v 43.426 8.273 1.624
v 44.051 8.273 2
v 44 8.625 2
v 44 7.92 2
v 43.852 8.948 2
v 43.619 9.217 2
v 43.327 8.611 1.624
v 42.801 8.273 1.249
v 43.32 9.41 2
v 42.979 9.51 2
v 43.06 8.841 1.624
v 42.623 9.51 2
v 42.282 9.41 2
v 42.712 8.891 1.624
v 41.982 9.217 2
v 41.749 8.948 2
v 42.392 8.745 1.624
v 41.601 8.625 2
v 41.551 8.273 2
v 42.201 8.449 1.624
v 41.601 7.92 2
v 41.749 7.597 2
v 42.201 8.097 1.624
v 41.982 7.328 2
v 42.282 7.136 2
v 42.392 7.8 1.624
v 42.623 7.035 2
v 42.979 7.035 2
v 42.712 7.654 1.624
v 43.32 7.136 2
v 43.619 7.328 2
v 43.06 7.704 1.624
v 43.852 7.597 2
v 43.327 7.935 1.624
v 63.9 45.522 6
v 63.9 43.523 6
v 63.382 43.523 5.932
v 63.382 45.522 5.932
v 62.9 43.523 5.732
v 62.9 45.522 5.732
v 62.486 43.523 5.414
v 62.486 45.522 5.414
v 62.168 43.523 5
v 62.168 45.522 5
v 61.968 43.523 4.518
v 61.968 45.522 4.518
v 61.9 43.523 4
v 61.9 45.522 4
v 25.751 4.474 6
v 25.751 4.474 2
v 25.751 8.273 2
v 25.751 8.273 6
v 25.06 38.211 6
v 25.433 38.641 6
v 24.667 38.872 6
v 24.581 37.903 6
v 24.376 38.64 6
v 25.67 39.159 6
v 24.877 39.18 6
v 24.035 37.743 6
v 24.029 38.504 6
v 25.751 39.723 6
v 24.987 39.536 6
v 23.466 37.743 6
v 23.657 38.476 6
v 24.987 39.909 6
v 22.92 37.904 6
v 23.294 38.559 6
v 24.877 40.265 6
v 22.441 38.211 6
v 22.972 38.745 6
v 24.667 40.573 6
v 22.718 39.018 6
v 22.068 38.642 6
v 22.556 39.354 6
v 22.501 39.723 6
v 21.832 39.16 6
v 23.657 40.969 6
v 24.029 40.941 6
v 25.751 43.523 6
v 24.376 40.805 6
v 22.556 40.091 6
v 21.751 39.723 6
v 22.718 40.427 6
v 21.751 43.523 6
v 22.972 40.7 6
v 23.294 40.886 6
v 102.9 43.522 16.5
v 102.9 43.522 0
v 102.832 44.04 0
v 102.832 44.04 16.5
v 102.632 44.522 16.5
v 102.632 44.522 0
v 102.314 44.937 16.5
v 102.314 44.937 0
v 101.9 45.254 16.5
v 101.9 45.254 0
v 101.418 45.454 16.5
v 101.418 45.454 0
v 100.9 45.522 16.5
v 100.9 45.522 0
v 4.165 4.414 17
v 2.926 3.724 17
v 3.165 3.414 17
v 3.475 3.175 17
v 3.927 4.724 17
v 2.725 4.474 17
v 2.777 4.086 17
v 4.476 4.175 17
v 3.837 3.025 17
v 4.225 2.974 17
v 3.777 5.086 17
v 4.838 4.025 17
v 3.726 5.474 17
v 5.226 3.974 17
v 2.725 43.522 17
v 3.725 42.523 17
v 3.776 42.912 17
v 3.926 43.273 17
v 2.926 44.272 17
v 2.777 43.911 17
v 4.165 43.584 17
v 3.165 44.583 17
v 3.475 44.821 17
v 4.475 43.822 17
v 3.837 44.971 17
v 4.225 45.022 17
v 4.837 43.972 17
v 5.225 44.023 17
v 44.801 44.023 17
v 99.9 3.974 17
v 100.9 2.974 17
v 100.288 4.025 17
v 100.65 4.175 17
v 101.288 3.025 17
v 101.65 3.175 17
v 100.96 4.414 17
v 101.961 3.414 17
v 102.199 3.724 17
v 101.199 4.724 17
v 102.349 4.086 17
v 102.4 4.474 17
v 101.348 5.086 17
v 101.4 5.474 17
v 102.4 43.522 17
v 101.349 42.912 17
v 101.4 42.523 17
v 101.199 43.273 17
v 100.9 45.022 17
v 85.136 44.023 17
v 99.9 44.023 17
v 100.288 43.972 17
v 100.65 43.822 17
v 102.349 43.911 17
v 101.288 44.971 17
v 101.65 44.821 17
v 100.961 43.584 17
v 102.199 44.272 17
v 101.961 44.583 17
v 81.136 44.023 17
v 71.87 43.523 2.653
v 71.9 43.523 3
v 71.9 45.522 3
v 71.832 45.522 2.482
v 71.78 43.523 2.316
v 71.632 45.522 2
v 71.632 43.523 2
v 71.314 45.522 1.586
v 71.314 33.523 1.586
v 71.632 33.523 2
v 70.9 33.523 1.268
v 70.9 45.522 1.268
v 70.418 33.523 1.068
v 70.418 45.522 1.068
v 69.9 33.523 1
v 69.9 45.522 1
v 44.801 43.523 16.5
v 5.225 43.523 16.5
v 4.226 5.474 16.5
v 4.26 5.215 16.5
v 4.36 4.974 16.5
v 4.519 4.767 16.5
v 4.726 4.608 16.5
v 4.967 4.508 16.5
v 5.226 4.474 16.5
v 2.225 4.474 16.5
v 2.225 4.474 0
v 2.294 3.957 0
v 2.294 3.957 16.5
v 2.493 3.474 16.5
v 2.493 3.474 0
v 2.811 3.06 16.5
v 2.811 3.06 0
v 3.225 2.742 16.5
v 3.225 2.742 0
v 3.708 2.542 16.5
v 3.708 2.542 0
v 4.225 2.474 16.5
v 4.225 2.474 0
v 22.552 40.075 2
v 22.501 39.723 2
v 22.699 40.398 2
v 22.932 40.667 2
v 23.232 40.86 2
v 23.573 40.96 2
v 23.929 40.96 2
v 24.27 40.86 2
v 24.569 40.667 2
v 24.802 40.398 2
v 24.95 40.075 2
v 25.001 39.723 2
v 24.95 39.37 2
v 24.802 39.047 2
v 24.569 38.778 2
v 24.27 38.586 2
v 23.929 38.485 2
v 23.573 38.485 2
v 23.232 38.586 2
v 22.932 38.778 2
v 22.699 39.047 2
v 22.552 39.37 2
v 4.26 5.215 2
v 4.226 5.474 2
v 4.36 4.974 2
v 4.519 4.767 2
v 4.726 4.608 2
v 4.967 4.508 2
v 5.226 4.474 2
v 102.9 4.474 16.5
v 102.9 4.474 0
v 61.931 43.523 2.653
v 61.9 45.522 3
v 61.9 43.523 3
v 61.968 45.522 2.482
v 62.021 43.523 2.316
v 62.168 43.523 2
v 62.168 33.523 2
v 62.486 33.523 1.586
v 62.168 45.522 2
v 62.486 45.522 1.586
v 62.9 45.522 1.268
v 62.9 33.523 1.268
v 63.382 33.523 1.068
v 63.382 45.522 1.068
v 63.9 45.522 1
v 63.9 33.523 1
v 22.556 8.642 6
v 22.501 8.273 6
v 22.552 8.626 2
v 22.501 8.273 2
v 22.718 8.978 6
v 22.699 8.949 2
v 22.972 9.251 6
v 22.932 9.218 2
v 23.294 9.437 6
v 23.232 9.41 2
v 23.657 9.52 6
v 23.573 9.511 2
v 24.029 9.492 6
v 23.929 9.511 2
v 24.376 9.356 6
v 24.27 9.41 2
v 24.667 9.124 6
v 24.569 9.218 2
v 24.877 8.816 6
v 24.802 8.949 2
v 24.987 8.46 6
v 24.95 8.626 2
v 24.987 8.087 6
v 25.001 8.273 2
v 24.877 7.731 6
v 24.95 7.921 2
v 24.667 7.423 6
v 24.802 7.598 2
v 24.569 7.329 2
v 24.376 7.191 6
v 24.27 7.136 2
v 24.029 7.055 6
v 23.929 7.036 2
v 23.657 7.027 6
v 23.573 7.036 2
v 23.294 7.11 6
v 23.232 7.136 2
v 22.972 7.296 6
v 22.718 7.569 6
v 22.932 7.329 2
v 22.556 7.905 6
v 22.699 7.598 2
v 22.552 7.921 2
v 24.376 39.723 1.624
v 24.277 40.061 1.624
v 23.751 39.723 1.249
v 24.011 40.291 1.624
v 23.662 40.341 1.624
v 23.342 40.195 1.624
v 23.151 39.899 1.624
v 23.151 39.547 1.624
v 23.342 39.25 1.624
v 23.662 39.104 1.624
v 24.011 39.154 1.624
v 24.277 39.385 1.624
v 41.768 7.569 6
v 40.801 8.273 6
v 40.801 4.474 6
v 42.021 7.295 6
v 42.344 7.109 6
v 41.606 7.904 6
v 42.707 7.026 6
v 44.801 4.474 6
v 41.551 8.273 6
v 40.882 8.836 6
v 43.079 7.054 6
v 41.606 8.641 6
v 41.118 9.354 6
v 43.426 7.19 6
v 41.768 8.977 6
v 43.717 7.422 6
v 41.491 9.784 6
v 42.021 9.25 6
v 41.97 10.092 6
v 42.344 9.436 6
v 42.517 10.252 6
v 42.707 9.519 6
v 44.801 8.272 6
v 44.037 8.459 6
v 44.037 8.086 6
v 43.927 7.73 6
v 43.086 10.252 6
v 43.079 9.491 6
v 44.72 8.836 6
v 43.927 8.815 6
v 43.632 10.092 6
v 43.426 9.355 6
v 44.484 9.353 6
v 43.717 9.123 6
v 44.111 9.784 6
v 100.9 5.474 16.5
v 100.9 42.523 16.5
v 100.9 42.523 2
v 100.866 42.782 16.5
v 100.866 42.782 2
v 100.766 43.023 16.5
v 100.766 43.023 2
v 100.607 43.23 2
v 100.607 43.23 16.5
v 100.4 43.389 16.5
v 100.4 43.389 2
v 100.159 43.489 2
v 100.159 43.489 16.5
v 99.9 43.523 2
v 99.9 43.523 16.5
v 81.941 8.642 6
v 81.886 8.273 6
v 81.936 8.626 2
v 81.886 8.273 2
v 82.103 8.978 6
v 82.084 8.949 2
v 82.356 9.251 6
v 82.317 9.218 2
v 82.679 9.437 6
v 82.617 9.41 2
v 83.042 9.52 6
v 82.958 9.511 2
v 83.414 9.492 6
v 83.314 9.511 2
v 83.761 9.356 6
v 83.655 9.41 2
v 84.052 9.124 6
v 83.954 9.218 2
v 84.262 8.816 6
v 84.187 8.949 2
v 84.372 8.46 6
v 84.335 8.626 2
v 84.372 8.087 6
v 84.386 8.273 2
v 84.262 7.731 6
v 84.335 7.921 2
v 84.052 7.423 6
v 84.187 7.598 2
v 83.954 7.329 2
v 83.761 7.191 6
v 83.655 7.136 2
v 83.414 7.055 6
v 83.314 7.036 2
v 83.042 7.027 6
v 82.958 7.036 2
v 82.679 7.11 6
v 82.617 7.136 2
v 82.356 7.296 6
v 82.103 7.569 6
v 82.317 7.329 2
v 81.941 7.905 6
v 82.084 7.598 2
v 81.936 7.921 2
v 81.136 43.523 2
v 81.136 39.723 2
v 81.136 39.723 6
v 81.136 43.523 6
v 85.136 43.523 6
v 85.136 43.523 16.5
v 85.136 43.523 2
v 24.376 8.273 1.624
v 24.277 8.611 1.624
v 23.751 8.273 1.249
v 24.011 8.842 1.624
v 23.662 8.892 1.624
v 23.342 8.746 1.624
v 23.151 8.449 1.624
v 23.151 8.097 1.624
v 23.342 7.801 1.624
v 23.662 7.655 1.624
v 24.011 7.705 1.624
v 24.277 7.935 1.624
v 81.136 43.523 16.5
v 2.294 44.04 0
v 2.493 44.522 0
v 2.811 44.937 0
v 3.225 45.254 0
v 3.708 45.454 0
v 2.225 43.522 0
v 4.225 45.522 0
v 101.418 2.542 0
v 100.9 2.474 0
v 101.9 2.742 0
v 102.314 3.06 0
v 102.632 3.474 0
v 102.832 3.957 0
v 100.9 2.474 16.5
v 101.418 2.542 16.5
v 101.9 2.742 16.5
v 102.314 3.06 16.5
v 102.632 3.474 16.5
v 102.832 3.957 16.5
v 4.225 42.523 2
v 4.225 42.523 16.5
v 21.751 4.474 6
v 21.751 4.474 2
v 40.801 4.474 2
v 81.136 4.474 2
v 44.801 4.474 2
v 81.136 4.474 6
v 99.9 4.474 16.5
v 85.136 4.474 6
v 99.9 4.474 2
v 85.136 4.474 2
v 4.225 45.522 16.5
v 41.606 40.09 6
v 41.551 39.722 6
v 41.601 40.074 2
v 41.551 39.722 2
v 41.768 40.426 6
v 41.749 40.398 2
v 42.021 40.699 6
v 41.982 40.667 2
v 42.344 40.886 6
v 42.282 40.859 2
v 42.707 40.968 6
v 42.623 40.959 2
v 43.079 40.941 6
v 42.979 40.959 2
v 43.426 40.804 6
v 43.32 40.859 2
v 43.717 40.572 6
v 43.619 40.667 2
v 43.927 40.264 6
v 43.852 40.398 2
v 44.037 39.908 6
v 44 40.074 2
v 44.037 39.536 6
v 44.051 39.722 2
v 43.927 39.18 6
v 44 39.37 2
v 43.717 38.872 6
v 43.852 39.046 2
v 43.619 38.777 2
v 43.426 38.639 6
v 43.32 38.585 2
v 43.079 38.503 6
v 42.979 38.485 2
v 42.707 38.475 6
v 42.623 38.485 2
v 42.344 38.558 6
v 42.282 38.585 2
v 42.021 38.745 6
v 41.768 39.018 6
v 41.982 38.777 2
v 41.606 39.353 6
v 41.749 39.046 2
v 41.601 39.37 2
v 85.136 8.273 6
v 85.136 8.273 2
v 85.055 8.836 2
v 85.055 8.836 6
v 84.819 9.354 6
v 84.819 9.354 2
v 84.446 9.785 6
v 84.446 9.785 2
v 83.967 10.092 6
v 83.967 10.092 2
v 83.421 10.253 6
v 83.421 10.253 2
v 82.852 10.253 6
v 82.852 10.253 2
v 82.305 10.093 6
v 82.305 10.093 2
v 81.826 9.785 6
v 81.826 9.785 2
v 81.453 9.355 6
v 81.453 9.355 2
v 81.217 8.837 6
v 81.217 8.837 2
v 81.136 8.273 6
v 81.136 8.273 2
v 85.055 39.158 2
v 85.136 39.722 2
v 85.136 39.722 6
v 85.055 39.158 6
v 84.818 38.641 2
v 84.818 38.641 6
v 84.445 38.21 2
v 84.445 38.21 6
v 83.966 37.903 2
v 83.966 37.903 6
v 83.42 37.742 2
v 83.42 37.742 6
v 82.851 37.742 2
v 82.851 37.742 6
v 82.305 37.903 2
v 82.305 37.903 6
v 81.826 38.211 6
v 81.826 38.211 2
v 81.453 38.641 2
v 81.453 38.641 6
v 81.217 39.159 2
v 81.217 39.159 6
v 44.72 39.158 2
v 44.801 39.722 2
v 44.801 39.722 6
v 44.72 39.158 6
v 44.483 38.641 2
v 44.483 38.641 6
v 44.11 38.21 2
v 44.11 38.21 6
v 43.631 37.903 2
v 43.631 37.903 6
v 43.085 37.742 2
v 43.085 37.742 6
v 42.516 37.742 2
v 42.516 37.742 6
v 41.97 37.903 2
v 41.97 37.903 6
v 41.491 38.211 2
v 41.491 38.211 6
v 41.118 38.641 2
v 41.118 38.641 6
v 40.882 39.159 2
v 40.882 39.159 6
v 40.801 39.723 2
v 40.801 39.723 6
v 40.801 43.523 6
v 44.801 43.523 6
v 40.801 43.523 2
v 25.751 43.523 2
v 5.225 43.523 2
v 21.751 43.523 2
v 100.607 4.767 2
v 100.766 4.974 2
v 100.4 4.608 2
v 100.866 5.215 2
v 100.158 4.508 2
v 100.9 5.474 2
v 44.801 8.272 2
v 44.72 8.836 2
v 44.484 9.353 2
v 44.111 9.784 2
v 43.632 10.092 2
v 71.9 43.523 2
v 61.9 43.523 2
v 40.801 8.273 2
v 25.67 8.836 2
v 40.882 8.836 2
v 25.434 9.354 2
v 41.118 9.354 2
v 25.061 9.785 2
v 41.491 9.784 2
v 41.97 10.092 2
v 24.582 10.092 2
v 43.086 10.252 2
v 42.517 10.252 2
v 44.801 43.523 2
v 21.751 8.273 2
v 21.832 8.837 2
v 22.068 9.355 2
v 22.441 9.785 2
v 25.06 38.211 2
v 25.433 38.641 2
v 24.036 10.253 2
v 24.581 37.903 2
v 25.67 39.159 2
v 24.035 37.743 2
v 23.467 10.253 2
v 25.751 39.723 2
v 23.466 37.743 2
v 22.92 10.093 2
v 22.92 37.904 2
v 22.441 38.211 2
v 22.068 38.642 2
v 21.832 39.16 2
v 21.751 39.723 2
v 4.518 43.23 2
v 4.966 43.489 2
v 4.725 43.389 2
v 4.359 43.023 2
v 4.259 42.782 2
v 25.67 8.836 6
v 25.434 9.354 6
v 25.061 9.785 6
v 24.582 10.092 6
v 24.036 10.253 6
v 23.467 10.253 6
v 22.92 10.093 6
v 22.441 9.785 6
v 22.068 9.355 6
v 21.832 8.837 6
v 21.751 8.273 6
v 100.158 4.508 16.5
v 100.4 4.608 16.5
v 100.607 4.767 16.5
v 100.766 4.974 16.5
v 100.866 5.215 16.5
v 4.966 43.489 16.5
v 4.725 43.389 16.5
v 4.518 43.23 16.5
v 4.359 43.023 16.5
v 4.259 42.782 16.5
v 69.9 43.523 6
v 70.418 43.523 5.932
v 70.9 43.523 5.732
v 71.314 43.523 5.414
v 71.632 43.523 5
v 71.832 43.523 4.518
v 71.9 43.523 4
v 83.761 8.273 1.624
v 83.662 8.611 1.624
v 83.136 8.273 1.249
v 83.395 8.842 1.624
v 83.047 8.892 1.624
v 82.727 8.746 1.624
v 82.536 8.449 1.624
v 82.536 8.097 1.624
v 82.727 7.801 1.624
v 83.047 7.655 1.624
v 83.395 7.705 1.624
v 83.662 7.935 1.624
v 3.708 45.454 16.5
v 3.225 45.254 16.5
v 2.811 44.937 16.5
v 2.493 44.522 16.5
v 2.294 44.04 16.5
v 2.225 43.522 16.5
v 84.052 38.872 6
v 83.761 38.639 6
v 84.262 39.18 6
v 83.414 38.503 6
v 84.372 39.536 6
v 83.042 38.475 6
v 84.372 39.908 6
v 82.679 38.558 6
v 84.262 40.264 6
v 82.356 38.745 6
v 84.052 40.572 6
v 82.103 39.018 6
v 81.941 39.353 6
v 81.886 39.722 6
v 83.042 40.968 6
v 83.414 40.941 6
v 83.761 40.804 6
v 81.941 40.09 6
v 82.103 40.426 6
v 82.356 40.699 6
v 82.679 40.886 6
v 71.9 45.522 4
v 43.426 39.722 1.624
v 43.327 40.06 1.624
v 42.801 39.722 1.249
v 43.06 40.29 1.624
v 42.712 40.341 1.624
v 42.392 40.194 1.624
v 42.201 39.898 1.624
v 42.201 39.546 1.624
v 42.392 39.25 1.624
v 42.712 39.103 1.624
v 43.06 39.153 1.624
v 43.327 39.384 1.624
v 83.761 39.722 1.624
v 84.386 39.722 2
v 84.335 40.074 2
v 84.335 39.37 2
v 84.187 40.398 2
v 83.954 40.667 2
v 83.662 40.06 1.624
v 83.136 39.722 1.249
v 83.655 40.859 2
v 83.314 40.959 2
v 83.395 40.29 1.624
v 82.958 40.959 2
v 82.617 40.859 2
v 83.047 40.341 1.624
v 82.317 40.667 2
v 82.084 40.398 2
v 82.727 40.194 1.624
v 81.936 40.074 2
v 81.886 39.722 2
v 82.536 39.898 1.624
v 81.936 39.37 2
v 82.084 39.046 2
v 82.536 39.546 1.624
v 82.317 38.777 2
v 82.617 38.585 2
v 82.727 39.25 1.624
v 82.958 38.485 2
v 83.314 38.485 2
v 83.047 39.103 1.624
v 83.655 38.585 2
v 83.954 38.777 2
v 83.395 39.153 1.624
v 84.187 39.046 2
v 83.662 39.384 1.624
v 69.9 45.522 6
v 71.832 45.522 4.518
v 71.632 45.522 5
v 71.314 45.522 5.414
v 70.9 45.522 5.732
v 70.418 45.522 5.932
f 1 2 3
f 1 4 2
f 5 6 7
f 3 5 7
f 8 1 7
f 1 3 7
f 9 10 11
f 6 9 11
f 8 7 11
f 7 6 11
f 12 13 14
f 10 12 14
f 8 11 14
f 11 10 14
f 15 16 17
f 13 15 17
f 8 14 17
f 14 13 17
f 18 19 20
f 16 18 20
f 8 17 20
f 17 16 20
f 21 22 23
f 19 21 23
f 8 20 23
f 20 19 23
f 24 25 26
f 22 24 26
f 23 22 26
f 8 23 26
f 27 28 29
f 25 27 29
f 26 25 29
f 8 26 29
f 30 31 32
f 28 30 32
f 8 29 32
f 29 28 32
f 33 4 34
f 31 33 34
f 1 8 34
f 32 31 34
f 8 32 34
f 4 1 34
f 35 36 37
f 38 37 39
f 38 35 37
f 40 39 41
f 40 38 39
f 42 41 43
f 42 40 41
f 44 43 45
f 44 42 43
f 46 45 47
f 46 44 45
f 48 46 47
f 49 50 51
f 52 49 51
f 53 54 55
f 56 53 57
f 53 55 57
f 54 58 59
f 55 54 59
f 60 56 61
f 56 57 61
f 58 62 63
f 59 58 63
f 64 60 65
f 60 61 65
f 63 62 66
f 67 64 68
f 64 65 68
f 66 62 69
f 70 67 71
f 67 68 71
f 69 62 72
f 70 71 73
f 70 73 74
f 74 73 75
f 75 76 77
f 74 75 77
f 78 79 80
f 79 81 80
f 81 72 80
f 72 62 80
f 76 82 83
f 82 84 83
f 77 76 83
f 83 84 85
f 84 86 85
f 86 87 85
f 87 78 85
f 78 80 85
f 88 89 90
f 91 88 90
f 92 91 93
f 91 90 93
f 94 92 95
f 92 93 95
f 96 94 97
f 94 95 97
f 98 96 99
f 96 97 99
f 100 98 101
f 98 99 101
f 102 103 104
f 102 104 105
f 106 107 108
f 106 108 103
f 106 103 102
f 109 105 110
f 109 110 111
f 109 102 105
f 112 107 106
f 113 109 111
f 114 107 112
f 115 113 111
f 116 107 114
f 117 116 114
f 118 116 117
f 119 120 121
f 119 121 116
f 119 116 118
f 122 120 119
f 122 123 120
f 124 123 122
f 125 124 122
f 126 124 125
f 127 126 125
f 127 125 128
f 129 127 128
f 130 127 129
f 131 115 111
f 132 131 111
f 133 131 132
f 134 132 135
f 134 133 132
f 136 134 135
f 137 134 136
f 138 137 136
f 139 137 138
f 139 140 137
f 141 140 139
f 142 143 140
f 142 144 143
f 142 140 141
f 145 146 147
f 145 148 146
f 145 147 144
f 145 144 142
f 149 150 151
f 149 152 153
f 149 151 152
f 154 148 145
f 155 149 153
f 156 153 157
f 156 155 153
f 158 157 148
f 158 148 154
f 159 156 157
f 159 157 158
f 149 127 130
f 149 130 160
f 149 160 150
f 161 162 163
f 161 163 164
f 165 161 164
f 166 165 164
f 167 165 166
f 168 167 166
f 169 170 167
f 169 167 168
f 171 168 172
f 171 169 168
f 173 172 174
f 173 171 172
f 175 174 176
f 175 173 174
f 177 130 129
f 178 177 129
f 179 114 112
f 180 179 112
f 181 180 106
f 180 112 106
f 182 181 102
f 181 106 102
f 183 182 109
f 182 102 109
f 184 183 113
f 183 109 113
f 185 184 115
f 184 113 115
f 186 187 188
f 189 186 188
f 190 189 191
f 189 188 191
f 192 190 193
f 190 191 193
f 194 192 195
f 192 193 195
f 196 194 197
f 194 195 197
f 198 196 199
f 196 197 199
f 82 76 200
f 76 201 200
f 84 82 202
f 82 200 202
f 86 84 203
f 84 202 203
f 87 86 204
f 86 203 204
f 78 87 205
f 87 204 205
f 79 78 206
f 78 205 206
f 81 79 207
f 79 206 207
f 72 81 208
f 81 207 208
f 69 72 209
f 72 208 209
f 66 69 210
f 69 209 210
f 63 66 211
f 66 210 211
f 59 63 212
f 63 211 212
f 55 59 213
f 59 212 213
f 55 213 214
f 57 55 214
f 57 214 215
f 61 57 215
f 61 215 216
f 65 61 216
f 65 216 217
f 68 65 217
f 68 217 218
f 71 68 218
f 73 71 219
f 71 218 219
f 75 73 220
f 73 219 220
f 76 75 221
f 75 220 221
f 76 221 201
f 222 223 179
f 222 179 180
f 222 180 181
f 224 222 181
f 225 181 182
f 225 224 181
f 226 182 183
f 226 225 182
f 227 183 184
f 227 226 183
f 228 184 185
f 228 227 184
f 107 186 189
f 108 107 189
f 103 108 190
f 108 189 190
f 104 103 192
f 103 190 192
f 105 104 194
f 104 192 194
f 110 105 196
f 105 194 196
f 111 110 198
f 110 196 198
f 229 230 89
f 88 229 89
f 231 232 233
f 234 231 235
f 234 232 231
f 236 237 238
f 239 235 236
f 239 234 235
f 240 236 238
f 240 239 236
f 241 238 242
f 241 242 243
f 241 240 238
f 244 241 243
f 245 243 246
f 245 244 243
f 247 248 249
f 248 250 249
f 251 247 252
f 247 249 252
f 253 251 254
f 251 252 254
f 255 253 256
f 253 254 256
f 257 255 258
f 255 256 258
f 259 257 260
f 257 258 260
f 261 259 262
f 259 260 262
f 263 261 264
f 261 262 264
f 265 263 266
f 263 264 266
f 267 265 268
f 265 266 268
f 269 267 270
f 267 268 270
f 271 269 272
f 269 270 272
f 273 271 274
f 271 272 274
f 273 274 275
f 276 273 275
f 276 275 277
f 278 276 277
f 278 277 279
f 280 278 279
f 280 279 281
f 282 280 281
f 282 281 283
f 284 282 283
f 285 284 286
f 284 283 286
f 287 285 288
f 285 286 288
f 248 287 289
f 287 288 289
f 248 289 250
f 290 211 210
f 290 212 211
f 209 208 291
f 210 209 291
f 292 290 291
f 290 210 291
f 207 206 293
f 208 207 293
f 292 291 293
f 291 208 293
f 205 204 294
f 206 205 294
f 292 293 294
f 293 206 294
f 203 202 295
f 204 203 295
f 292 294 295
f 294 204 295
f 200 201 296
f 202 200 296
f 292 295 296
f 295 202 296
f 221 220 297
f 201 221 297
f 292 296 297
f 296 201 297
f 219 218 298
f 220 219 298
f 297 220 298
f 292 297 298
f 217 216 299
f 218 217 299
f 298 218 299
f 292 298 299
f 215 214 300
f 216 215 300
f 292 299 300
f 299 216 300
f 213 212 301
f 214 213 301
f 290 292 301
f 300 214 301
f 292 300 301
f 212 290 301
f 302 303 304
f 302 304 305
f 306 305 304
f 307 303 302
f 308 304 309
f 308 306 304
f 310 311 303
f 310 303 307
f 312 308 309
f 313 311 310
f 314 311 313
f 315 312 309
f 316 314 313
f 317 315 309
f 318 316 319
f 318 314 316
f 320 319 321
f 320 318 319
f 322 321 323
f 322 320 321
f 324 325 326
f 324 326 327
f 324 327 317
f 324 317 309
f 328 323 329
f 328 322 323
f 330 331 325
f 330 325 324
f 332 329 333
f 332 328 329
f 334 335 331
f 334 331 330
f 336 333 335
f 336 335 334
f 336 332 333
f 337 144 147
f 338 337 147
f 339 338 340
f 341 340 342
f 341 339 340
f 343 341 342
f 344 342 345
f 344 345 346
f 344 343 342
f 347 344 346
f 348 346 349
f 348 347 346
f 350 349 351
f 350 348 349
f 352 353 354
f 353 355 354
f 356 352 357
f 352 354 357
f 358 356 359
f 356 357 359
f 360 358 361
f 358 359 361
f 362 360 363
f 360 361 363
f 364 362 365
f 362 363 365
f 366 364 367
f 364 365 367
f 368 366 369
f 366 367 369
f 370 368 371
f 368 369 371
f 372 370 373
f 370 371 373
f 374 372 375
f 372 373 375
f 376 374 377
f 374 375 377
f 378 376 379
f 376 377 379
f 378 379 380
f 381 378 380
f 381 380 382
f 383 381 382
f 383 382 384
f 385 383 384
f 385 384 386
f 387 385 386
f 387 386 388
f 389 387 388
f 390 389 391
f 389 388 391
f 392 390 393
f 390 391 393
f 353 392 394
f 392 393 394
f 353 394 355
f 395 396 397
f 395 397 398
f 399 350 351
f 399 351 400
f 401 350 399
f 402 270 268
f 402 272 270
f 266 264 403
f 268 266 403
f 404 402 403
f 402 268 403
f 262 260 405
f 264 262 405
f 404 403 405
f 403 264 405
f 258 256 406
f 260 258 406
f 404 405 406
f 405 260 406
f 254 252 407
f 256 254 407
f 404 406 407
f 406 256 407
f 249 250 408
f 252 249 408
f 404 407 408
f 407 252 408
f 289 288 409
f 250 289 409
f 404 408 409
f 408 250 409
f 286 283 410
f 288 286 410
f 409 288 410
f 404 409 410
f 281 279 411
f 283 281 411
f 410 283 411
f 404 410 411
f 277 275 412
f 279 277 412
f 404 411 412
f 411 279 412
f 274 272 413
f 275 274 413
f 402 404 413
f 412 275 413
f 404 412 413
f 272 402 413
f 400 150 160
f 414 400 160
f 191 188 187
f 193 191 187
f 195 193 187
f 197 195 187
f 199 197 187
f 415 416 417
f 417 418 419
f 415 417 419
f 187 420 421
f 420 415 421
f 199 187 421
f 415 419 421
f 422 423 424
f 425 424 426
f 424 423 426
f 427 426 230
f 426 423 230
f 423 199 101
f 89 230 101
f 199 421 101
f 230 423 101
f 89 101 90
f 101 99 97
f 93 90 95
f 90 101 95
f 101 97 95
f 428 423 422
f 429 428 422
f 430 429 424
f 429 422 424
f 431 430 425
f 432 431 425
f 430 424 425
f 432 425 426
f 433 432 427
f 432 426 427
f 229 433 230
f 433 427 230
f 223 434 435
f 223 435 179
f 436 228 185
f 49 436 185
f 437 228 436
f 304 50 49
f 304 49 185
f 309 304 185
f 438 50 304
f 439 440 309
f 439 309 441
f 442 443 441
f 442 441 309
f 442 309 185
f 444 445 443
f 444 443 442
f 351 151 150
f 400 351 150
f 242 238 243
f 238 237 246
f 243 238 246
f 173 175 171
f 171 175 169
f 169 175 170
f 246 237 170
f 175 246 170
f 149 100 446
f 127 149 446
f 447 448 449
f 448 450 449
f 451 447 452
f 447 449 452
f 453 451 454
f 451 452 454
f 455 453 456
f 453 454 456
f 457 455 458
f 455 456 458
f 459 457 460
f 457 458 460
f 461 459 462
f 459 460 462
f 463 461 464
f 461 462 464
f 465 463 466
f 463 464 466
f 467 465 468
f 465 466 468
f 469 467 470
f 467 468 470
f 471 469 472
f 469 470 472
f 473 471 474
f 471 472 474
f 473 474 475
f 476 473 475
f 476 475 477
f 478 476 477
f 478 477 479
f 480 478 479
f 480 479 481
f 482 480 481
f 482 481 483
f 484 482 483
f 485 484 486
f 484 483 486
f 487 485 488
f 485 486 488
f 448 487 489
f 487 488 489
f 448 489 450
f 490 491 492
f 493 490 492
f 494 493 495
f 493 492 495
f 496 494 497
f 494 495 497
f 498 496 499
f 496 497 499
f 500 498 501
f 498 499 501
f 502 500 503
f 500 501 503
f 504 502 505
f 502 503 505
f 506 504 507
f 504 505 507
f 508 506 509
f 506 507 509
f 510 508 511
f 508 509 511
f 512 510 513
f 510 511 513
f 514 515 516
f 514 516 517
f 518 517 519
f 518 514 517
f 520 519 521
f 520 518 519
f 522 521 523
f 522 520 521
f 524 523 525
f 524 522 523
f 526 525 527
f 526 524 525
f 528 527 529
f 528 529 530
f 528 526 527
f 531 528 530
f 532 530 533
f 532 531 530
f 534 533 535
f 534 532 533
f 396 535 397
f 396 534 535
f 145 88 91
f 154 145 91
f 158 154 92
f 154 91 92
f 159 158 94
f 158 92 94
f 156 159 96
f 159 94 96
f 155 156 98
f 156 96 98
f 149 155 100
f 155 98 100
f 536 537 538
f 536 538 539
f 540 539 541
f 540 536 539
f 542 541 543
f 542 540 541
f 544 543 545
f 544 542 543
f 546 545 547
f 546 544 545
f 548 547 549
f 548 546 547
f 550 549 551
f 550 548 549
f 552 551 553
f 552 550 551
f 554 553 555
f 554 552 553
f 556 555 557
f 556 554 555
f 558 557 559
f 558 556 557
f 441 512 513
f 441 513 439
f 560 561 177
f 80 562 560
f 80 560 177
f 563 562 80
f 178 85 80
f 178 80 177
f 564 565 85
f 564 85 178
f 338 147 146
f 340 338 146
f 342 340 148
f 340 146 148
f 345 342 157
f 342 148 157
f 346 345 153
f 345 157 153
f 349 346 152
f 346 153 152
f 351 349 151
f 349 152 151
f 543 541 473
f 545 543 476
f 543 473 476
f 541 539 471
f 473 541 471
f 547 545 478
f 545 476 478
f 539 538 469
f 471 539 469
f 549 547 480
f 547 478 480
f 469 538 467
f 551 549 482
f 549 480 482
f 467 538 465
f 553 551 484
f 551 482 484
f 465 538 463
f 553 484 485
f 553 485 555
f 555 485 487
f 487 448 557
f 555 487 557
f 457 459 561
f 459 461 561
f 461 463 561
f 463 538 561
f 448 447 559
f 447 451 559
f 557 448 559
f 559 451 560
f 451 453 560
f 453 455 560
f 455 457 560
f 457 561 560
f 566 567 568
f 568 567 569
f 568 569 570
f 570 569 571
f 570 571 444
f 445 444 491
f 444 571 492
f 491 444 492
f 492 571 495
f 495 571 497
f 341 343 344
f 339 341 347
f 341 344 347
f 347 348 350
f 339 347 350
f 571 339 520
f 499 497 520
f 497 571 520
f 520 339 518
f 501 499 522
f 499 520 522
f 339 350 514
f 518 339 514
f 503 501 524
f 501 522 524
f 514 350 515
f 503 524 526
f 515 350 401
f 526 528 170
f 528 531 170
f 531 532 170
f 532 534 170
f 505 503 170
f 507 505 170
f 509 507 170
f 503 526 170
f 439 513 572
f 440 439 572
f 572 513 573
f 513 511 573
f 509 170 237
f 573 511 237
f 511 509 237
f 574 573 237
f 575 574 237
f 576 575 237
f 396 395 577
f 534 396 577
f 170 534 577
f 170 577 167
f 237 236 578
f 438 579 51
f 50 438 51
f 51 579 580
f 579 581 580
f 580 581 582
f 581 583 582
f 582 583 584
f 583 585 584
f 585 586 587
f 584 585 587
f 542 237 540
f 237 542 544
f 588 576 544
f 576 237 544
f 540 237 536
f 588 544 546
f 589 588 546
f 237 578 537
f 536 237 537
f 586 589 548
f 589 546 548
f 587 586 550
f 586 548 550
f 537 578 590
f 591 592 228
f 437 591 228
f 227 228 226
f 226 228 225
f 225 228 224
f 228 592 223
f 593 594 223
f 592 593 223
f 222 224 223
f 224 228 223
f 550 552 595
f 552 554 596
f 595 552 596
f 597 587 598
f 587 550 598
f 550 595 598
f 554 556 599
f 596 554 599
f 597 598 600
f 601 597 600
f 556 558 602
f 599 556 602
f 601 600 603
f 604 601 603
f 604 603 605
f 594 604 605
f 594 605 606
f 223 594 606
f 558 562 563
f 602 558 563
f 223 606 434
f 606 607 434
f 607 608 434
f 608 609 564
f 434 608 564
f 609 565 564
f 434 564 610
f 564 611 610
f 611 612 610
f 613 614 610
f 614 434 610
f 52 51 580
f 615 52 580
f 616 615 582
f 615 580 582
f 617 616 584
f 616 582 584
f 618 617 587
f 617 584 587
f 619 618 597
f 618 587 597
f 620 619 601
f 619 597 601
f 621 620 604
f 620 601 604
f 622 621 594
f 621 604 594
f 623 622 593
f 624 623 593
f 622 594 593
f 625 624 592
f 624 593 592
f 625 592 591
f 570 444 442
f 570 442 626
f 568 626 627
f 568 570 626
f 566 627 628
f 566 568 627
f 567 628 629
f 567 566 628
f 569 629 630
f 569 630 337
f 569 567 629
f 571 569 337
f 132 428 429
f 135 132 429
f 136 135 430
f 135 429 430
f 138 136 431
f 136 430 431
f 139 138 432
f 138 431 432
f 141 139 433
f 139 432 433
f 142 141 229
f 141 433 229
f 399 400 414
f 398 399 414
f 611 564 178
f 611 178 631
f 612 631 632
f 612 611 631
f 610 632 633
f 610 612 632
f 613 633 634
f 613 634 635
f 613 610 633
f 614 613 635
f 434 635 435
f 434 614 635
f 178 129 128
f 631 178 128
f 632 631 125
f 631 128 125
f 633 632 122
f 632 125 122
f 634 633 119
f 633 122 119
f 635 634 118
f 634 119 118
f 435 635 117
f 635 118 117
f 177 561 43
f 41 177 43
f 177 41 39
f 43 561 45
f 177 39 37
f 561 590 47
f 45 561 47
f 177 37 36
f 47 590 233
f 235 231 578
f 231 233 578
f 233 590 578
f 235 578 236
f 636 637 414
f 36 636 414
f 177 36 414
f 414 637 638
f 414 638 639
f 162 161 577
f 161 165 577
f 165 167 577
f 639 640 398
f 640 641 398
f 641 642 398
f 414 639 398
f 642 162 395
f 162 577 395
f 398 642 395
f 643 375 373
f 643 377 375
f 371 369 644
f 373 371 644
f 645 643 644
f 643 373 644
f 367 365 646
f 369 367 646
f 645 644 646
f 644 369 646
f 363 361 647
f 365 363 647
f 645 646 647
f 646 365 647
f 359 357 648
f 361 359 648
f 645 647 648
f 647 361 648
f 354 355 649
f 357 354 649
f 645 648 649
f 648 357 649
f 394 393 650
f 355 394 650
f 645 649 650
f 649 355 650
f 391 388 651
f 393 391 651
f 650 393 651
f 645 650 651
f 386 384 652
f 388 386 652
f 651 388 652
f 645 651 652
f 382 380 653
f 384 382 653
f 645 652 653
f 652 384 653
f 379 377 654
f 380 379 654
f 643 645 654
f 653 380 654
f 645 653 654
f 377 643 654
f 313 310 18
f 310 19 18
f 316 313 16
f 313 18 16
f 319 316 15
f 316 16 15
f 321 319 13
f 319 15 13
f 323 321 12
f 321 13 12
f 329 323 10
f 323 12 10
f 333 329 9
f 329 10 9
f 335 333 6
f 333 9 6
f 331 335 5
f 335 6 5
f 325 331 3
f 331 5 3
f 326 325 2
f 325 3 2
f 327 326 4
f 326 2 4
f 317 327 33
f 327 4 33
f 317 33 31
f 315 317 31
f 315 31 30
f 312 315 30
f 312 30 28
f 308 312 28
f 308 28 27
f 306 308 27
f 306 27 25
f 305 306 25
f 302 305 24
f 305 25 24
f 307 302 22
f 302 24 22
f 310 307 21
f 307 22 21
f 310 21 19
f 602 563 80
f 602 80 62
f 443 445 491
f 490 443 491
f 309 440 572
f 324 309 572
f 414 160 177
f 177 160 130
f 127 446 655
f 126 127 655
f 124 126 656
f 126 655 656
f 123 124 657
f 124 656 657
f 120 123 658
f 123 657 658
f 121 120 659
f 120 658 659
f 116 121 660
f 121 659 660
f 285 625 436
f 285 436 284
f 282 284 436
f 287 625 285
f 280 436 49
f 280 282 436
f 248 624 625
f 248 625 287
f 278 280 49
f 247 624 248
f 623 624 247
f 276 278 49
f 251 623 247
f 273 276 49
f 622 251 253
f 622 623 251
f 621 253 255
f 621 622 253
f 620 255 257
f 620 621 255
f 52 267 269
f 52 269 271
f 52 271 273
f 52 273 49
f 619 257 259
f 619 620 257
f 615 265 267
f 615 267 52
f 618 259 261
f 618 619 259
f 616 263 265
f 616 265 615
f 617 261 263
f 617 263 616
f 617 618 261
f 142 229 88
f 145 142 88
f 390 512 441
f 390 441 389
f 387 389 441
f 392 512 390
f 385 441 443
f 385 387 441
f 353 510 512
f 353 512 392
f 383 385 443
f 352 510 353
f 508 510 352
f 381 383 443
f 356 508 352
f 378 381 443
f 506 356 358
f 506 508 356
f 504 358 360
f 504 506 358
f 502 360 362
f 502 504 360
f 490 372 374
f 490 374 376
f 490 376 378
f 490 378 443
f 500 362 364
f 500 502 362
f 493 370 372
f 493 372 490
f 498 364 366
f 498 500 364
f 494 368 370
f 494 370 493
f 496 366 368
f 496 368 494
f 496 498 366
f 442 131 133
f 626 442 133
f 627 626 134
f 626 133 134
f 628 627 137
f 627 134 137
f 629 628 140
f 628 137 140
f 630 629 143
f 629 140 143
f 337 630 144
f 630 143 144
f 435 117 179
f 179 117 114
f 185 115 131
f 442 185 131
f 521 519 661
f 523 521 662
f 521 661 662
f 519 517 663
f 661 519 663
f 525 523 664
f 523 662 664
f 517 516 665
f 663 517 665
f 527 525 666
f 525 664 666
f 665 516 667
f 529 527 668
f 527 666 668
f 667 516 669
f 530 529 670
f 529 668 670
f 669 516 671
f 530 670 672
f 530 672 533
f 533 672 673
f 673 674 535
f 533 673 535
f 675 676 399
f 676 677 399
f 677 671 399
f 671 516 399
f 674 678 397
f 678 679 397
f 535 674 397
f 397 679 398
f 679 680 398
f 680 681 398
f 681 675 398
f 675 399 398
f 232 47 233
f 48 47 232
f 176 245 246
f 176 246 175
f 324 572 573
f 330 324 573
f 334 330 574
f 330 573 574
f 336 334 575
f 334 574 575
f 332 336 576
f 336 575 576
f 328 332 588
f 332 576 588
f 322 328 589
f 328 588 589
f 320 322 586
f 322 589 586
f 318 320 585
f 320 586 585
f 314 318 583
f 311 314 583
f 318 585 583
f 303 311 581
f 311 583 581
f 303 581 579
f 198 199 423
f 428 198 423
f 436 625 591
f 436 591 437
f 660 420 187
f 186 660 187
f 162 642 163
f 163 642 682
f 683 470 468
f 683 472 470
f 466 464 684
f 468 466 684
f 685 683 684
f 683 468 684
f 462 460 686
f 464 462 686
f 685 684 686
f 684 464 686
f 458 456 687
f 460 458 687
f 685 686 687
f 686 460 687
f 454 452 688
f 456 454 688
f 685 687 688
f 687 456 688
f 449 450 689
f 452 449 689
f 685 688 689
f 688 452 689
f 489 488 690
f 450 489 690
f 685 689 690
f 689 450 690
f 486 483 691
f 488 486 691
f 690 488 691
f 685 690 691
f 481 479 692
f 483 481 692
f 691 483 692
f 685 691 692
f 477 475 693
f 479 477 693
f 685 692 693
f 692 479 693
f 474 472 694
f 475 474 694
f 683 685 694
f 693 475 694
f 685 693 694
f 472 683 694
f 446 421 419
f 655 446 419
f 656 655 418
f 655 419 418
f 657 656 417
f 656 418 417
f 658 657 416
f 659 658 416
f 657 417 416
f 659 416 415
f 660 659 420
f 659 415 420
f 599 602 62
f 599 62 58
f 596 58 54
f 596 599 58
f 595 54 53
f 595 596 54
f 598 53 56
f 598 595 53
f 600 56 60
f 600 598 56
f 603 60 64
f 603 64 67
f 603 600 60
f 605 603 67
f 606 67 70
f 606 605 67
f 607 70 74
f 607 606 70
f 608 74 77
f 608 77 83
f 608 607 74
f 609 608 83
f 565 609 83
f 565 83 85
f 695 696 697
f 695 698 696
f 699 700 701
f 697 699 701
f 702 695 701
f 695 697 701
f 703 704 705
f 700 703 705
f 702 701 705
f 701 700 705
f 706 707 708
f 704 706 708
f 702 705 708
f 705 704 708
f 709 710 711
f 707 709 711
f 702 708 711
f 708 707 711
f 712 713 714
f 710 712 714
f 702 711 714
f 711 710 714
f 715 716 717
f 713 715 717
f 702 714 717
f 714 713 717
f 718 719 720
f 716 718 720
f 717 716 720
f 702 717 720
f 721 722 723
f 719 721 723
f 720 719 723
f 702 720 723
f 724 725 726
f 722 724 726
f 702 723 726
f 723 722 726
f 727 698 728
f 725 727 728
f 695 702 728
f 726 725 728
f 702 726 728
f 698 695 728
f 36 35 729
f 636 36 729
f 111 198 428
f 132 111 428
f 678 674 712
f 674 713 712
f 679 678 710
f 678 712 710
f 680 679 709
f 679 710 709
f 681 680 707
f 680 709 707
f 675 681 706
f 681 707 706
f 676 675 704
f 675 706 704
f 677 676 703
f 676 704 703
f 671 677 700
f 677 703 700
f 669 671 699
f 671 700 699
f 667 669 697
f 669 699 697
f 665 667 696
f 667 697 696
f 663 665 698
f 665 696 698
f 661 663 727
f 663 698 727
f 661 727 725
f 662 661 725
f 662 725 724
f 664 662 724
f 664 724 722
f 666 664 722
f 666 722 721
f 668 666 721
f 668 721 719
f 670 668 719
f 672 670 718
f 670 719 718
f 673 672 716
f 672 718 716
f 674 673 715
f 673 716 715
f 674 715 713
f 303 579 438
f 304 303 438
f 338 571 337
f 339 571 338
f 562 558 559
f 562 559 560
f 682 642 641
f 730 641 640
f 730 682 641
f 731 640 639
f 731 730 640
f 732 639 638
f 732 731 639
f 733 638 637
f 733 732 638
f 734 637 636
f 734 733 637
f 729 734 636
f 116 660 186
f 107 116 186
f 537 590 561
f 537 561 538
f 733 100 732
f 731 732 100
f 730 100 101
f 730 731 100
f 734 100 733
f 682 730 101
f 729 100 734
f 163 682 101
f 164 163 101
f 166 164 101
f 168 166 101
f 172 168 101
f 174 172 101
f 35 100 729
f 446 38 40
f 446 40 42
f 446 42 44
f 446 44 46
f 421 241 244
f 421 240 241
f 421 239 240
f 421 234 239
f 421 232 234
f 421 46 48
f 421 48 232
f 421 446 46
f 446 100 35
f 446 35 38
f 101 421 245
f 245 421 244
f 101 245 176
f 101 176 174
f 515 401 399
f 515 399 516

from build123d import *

# Parameters (mm, degrees)
EXTRUDE_1_DEPTH     = 2
SKETCH_2_W          = 10
SKETCH_2_H          = 10
CUT_EXTRUDE_1_DEPTH = 1
EXTRUDE_2_DEPTH     = 15
EXTRUDE_3_DEPTH     = 4
MM_2_D              = 2.5
MM_2_DEPTH          = 4
MM_2_TIP            = 0.751075774
SKETCH_9_W          = 10
SKETCH_9_H          = 5
CUT_EXTRUDE_2_DEPTH = 2
FILLET_1_R          = 2
CHAMFER_1_SIZE      = 0.5


with BuildPart() as part:
    # 草图1 → 凸台-拉伸1 (new body)
    with BuildSketch(Plane.XY):
        with BuildLine():
            Line((2.225416965, 43.522410124), (2.225416965, 4.474270124))
            ThreePointArc((2.225416965, 4.474270124), (2.811203402, 3.060056561), (4.225416965, 2.474270124))
            Line((4.225416965, 2.474270124), (100.900116965, 2.474270124))
            ThreePointArc((100.900116965, 2.474270124), (102.314330527, 3.060056561), (102.900116965, 4.474270124))
            Line((102.900116965, 4.474270124), (102.900116965, 43.522410124))
            ThreePointArc((102.900116965, 43.522410124), (102.314330527, 44.936623686), (100.900116965, 45.522410124))
            Line((100.900116965, 45.522410124), (4.225416965, 45.522410124))
            ThreePointArc((4.225416965, 45.522410124), (2.811203402, 44.936623686), (2.225416965, 43.522410124))
        make_face()
    extrude(amount=EXTRUDE_1_DEPTH)

    # 草图2 → 切除-拉伸1 (cut)
    with BuildSketch(Plane.XY.offset(2)):
        with Locations((66.900116965, 38.523360124)):
            Rectangle(SKETCH_2_W, SKETCH_2_H)
    extrude(amount=-CUT_EXTRUDE_1_DEPTH, mode=Mode.SUBTRACT)

    # 草图3 → 凸台-拉伸2 (add)
    with BuildSketch(Plane.XY.offset(2)):
        with BuildLine():
            Line((100.900116965, 45.522410124), (4.225416965, 45.522410124))
            ThreePointArc((4.225416965, 45.522410124), (2.811203402, 44.936623686), (2.225416965, 43.522410124))
            Line((2.225416965, 43.522410124), (2.225416965, 4.474270124))
            ThreePointArc((2.225416965, 4.474270124), (2.811203402, 3.060056561), (4.225416965, 2.474270124))
            Line((4.225416965, 2.474270124), (100.900116965, 2.474270124))
            ThreePointArc((100.900116965, 2.474270124), (102.314330527, 3.060056561), (102.900116965, 4.474270124))
            Line((102.900116965, 4.474270124), (102.900116965, 43.522410124))
            ThreePointArc((102.900116965, 43.522410124), (102.314330527, 44.936623686), (100.900116965, 45.522410124))
        make_face()
        with BuildLine():
            Line((99.900259554, 43.523360121), (85.135816842, 43.522660124))
            Line((85.135816842, 43.522660124), (81.135817087, 43.522660124))
            Line((81.135817087, 43.522660124), (44.800816842, 43.523360124))
            Line((44.800816842, 43.523360124), (40.800817087, 43.523360124))
            Line((40.800817087, 43.523360124), (25.750866842, 43.523360124))
            Line((25.750866842, 43.523360124), (21.750867087, 43.523360124))
            Line((21.750867087, 43.523360124), (5.225191965, 43.523360124))
            ThreePointArc((5.225191965, 43.523360124), (4.518078599, 43.23046032), (4.225191965, 42.5233415))
            Line((4.225191965, 42.5233415), (4.225881965, 5.474270124))
            ThreePointArc((4.225881965, 5.474270124), (4.518775184, 4.767163343), (5.225881965, 4.474270124))
            Line((5.225881965, 4.474270124), (21.750867087, 4.474270124))
            Line((21.750867087, 4.474270124), (25.750866842, 4.474270124))
            Line((25.750866842, 4.474270124), (40.800817087, 4.474270124))
            Line((40.800817087, 4.474270124), (44.800816842, 4.474270124))
            Line((44.800816842, 4.474270124), (81.135817087, 4.474270124))
            Line((81.135817087, 4.474270124), (85.135816842, 4.474270124))
            Line((85.135816842, 4.474270124), (99.899616965, 4.474270124))
            ThreePointArc((99.899616965, 4.474270124), (100.606717161, 4.767156758), (100.899616964, 5.4742515))
            Line((100.899616964, 5.4742515), (100.900306965, 42.523360124))
            ThreePointArc((100.900306965, 42.523360124), (100.607396983, 43.230483666), (99.900259554, 43.523360121))
        make_face(mode=Mode.SUBTRACT)
    extrude(amount=EXTRUDE_2_DEPTH)

    # 草图4 → 凸台-拉伸3 (add)
    with BuildSketch(Plane.XY.offset(2)):
        with BuildLine():
            Line((21.750867087, 39.723310124), (21.750867087, 43.523360124))
            Line((21.750867087, 43.523360124), (25.750866842, 43.523360124))
            Line((25.750866842, 43.523360124), (25.750866842, 39.722610124))
            ThreePointArc((25.750866842, 39.722610124), (23.750516904, 37.722610216), (21.750867087, 39.723310124))
        make_face()
        with BuildLine():
            Line((40.800817087, 39.722610124), (40.800817087, 43.523360124))
            Line((40.800817087, 43.523360124), (44.800816842, 43.523360124))
            Line((44.800816842, 43.523360124), (44.800816842, 39.721910124))
            ThreePointArc((44.800816842, 39.721910124), (42.800466904, 37.721910216), (40.800817087, 39.722610124))
        make_face()
        with BuildLine():
            Line((81.135817087, 39.722610124), (81.135817087, 43.522660124))
            Line((81.135817087, 43.522660124), (85.135816842, 43.522660124))
            Line((85.135816842, 43.522660124), (85.135816842, 39.721910124))
            ThreePointArc((85.135816842, 39.721910124), (83.135466904, 37.721910216), (81.135817087, 39.722610124))
        make_face()
        with BuildLine():
            Line((21.750867087, 8.273350124), (21.750867087, 4.474270124))
            Line((21.750867087, 4.474270124), (25.750866842, 4.474270124))
            Line((25.750866842, 4.474270124), (25.750866842, 8.272650124))
            ThreePointArc((25.750866842, 8.272650124), (23.751217026, 10.273350032), (21.750867087, 8.273350124))
        make_face()
        with BuildLine():
            Line((40.800817087, 8.272650124), (40.800817087, 4.474270124))
            Line((40.800817087, 4.474270124), (44.800816842, 4.474270124))
            Line((44.800816842, 4.474270124), (44.800816842, 8.271950124))
            ThreePointArc((44.800816842, 8.271950124), (42.801167026, 10.272650032), (40.800817087, 8.272650124))
        make_face()
        with BuildLine():
            Line((81.135817087, 8.273350124), (81.135817087, 4.474270124))
            Line((81.135817087, 4.474270124), (85.135816842, 4.474270124))
            Line((85.135816842, 4.474270124), (85.135816842, 8.272650124))
            ThreePointArc((85.135816842, 8.272650124), (83.136167026, 10.273350032), (81.135817087, 8.273350124))
        make_face()
    extrude(amount=EXTRUDE_3_DEPTH)

    # 大小mm 暗销孔2
    with Locations(Plane(origin=(23.750866904, 39.722610124, 6), x_dir=(1, 0, 0), z_dir=(0, 0, 1))):
        with Locations((0, 0), (19.04995, -0.0007), (59.38495, -0.0007), (59.384950122, -31.44926), (19.049950122, -31.44996), (1.22e-07, -31.44926)):
            Hole(MM_2_D / 2, depth=MM_2_DEPTH)
            with Locations((0, 0, -(MM_2_DEPTH + MM_2_TIP / 2))):  # 118° drill point
                Cone(0, MM_2_D / 2, MM_2_TIP, mode=Mode.SUBTRACT)

    # 草图9 → 切除-拉伸2 (cut)
    with BuildSketch(Plane(origin=(0, 45.522410124, 0), x_dir=(1, 0, 0), z_dir=(0, 1, 0))):
        with Locations((66.900116965, -3.5)):
            Rectangle(SKETCH_9_W, SKETCH_9_H)
    extrude(amount=-CUT_EXTRUDE_2_DEPTH, mode=Mode.SUBTRACT)

    # 圆角1
    # the kernel refuses this fillet: 2 mm, written as the material it adds along each edge
    with BuildSketch(Plane(origin=(61.900116965, 45.522410124, 6), x_dir=(0, 0, -1), z_dir=(0, -1, 0))) as fillet_1_piece_1_section:
        with BuildLine():
            CenterArc((FILLET_1_R, FILLET_1_R), FILLET_1_R, 180, 90)
            Line((0, FILLET_1_R), (0, 0))
            Line((0, 0), (FILLET_1_R, 0))
        make_face()
    fillet_1_piece_1 = extrude(amount=6.999379421, mode=Mode.PRIVATE)
    fillet_1_piece_1 = split(fillet_1_piece_1, bisect_by=Plane(origin=(62.352889725, 43.52302198, 5.54721083), z_dir=(1.9265171188797207e-05, 0.9999999998144267, 0)), keep=Keep.TOP, mode=Mode.PRIVATE)
    add(fillet_1_piece_1)
    with BuildSketch(Plane(origin=(71.900116965, 45.522410124, 6), x_dir=(-1, 0, 0), z_dir=(0, -1, 0))) as fillet_1_piece_2_section:
        with BuildLine():
            CenterArc((FILLET_1_R, FILLET_1_R), FILLET_1_R, 180, 90)
            Line((0, FILLET_1_R), (0, 0))
            Line((0, 0), (FILLET_1_R, 0))
        make_face()
    fillet_1_piece_2 = extrude(amount=6.999572073, mode=Mode.PRIVATE)
    fillet_1_piece_2 = split(fillet_1_piece_2, bisect_by=Plane(origin=(71.447309266, 43.522846774, 5.547208713), z_dir=(1.9265171188797207e-05, 0.9999999998144267, 0)), keep=Keep.TOP, mode=Mode.PRIVATE)
    add(fillet_1_piece_2)
    with BuildSketch(Plane(origin=(71.900116965, 28.523360124, 1), x_dir=(0, 0, 1), z_dir=(0, 1, 0))) as fillet_1_piece_3_section:
        with BuildLine():
            CenterArc((FILLET_1_R, -FILLET_1_R), FILLET_1_R, 90, 90)
            Line((0, -FILLET_1_R), (0, 0))
            Line((0, 0), (FILLET_1_R, 0))
        make_face()
    fillet_1_piece_3 = extrude(amount=16.99905, mode=Mode.PRIVATE)
    fillet_1_piece_3 = split(fillet_1_piece_3, bisect_by=Plane(origin=(71.389876845, 33.523360124, 1.328783529), z_dir=(0, -1, 0)), keep=Keep.TOP, mode=Mode.PRIVATE)
    fillet_1_piece_3 = split(fillet_1_piece_3, bisect_by=Plane(origin=(71.389876845, 31.023360124, 2), z_dir=(0, 0, -1)), keep=Keep.TOP, mode=Mode.PRIVATE)
    add(fillet_1_piece_3)
    with BuildSketch(Plane(origin=(71.900116965, 33.523360124, 1), x_dir=(0, 0, 1), z_dir=(0, 1, 0))) as fillet_1_piece_4_section:
        with BuildLine():
            CenterArc((FILLET_1_R, -FILLET_1_R), FILLET_1_R, 90, 90)
            Line((0, -FILLET_1_R), (0, 0))
            Line((0, 0), (FILLET_1_R, 0))
        make_face()
    fillet_1_piece_4 = extrude(amount=11.99905, mode=Mode.PRIVATE)
    fillet_1_piece_4 = split(fillet_1_piece_4, bisect_by=Plane(origin=(71.389876488, 38.523104002, 2), z_dir=(0, 0, -1)), keep=Keep.TOP, mode=Mode.PRIVATE)
    fillet_1_piece_4 = split(fillet_1_piece_4, bisect_by=Plane(origin=(71.389972809, 43.522847879, 1.3287834), z_dir=(-1.9265171188797207e-05, -0.9999999998144267, 0)), keep=Keep.TOP, mode=Mode.PRIVATE)
    add(fillet_1_piece_4)
    with BuildSketch(Plane(origin=(71.900116965, 33.523360124, 1), x_dir=(0, 0, 1), z_dir=(0, 1, 0))) as fillet_1_piece_5_section:
        with BuildLine():
            CenterArc((FILLET_1_R, -FILLET_1_R), FILLET_1_R, 90, 90)
            Line((0, -FILLET_1_R), (0, 0))
            Line((0, 0), (FILLET_1_R, 0))
        make_face()
    fillet_1_piece_5 = extrude(amount=11.99905, mode=Mode.PRIVATE)
    fillet_1_piece_5 = split(fillet_1_piece_5, bisect_by=Plane(origin=(71.852100247, 44.52262455, 2), z_dir=(0, 0, 1)), keep=Keep.TOP, mode=Mode.PRIVATE)
    fillet_1_piece_5 = split(fillet_1_piece_5, bisect_by=Plane(origin=(71.852080986, 43.522838976, 2.326501665), z_dir=(1.9265171188797207e-05, 0.9999999998144267, 0)), keep=Keep.TOP, mode=Mode.PRIVATE)
    add(fillet_1_piece_5)
    with BuildSketch(Plane(origin=(71.900116965, 33.523360124, 1), x_dir=(0, 0, 1), z_dir=(0, 1, 0))) as fillet_1_piece_6_section:
        with BuildLine():
            CenterArc((FILLET_1_R, -FILLET_1_R), FILLET_1_R, 90, 90)
            Line((0, -FILLET_1_R), (0, 0))
            Line((0, 0), (FILLET_1_R, 0))
        make_face()
    fillet_1_piece_6 = extrude(amount=11.99905, mode=Mode.PRIVATE)
    fillet_1_piece_6 = split(fillet_1_piece_6, bisect_by=Plane(origin=(71.389878628, 44.522629002, 2), z_dir=(0, 0, -1)), keep=Keep.TOP, mode=Mode.PRIVATE)
    fillet_1_piece_6 = split(fillet_1_piece_6, bisect_by=Plane(origin=(71.389859367, 43.522847881, 1.328784171), z_dir=(1.9265171188797207e-05, 0.9999999998144267, 0)), keep=Keep.TOP, mode=Mode.PRIVATE)
    add(fillet_1_piece_6)
    with BuildSketch(Plane(origin=(61.900116965, 45.522410124, 1), x_dir=(0, 0, 1), z_dir=(0, -1, 0))) as fillet_1_piece_7_section:
        with BuildLine():
            CenterArc((FILLET_1_R, -FILLET_1_R), FILLET_1_R, 90, 90)
            Line((0, -FILLET_1_R), (0, 0))
            Line((0, 0), (FILLET_1_R, 0))
        make_face()
    fillet_1_piece_7 = extrude(amount=11.99905, mode=Mode.PRIVATE)
    fillet_1_piece_7 = split(fillet_1_piece_7, bisect_by=Plane(origin=(61.948114515, 43.523029778, 2.326501473), z_dir=(1.9265171188797207e-05, 0.9999999998144267, 0)), keep=Keep.TOP, mode=Mode.PRIVATE)
    fillet_1_piece_7 = split(fillet_1_piece_7, bisect_by=Plane(origin=(61.948133774, 44.522719951, 2), z_dir=(0, 0, 1)), keep=Keep.TOP, mode=Mode.PRIVATE)
    add(fillet_1_piece_7)
    with BuildSketch(Plane(origin=(61.900116965, 45.522410124, 1), x_dir=(0, 0, 1), z_dir=(0, -1, 0))) as fillet_1_piece_8_section:
        with BuildLine():
            CenterArc((FILLET_1_R, -FILLET_1_R), FILLET_1_R, 90, 90)
            Line((0, -FILLET_1_R), (0, 0))
            Line((0, 0), (FILLET_1_R, 0))
        make_face()
    fillet_1_piece_8 = extrude(amount=11.99905, mode=Mode.PRIVATE)
    fillet_1_piece_8 = split(fillet_1_piece_8, bisect_by=Plane(origin=(62.410339609, 43.523020873, 1.328782886), z_dir=(1.9265171188797207e-05, 0.9999999998144267, 0)), keep=Keep.TOP, mode=Mode.PRIVATE)
    fillet_1_piece_8 = split(fillet_1_piece_8, bisect_by=Plane(origin=(62.410358868, 44.522715498, 2), z_dir=(0, 0, -1)), keep=Keep.TOP, mode=Mode.PRIVATE)
    add(fillet_1_piece_8)
    with BuildSketch(Plane(origin=(61.900116965, 45.522410124, 1), x_dir=(0, 0, 1), z_dir=(0, -1, 0))) as fillet_1_piece_9_section:
        with BuildLine():
            CenterArc((FILLET_1_R, -FILLET_1_R), FILLET_1_R, 90, 90)
            Line((0, -FILLET_1_R), (0, 0))
            Line((0, 0), (FILLET_1_R, 0))
        make_face()
    fillet_1_piece_9 = extrude(amount=11.99905, mode=Mode.PRIVATE)
    fillet_1_piece_9 = split(fillet_1_piece_9, bisect_by=Plane(origin=(62.410453051, 43.523020871, 1.328783657), z_dir=(-1.9265171188797207e-05, -0.9999999998144267, 0)), keep=Keep.TOP, mode=Mode.PRIVATE)
    fillet_1_piece_9 = split(fillet_1_piece_9, bisect_by=Plane(origin=(62.410356728, 38.523190498, 2), z_dir=(0, 0, -1)), keep=Keep.TOP, mode=Mode.PRIVATE)
    add(fillet_1_piece_9)
    with BuildSketch(Plane(origin=(61.900116965, 45.522410124, 1), x_dir=(0, 0, 1), z_dir=(0, -1, 0))) as fillet_1_piece_10_section:
        with BuildLine():
            CenterArc((FILLET_1_R, -FILLET_1_R), FILLET_1_R, 90, 90)
            Line((0, -FILLET_1_R), (0, 0))
            Line((0, 0), (FILLET_1_R, 0))
        make_face()
    fillet_1_piece_10 = extrude(amount=16.99905, mode=Mode.PRIVATE)
    fillet_1_piece_10 = split(fillet_1_piece_10, bisect_by=Plane(origin=(62.410357085, 31.023360124, 2), z_dir=(0, 0, -1)), keep=Keep.TOP, mode=Mode.PRIVATE)
    fillet_1_piece_10 = split(fillet_1_piece_10, bisect_by=Plane(origin=(62.410357085, 33.523360124, 1.328783529), z_dir=(0, -1, 0)), keep=Keep.TOP, mode=Mode.PRIVATE)
    add(fillet_1_piece_10)

    # 倒角1
    chamfer_1_edges = [part.edges().sort_by_distance(p)[0] for p in [
        (102.314330527, 44.936623686, 17),
        (52.562766965, 45.522410124, 17),
        (2.811203402, 44.936623686, 17),
        (2.225416965, 23.998340124, 17),
        (2.811203402, 3.060056561, 17),
        (52.562766965, 2.474270124, 17),
        (102.314330527, 3.060056561, 17),
        (102.900116965, 23.998340124, 17),
        (100.607396983, 43.230483666, 17),
        (92.518038198, 43.523010123, 17),
        (83.135816965, 43.522660124, 17),
        (62.968316965, 43.523010124, 17),
        (25.013004404, 43.523360124, 17),
        (4.518078599, 43.23046032, 17),
        (4.225536965, 23.998805812, 17),
        (4.518775184, 4.767163343, 17),
        (52.562749465, 4.474270124, 17),
        (100.606717161, 4.767156758, 17),
        (100.899961965, 23.998805812, 17),
    ]]
    chamfer(chamfer_1_edges, length=CHAMFER_1_SIZE)


solid = part.part
